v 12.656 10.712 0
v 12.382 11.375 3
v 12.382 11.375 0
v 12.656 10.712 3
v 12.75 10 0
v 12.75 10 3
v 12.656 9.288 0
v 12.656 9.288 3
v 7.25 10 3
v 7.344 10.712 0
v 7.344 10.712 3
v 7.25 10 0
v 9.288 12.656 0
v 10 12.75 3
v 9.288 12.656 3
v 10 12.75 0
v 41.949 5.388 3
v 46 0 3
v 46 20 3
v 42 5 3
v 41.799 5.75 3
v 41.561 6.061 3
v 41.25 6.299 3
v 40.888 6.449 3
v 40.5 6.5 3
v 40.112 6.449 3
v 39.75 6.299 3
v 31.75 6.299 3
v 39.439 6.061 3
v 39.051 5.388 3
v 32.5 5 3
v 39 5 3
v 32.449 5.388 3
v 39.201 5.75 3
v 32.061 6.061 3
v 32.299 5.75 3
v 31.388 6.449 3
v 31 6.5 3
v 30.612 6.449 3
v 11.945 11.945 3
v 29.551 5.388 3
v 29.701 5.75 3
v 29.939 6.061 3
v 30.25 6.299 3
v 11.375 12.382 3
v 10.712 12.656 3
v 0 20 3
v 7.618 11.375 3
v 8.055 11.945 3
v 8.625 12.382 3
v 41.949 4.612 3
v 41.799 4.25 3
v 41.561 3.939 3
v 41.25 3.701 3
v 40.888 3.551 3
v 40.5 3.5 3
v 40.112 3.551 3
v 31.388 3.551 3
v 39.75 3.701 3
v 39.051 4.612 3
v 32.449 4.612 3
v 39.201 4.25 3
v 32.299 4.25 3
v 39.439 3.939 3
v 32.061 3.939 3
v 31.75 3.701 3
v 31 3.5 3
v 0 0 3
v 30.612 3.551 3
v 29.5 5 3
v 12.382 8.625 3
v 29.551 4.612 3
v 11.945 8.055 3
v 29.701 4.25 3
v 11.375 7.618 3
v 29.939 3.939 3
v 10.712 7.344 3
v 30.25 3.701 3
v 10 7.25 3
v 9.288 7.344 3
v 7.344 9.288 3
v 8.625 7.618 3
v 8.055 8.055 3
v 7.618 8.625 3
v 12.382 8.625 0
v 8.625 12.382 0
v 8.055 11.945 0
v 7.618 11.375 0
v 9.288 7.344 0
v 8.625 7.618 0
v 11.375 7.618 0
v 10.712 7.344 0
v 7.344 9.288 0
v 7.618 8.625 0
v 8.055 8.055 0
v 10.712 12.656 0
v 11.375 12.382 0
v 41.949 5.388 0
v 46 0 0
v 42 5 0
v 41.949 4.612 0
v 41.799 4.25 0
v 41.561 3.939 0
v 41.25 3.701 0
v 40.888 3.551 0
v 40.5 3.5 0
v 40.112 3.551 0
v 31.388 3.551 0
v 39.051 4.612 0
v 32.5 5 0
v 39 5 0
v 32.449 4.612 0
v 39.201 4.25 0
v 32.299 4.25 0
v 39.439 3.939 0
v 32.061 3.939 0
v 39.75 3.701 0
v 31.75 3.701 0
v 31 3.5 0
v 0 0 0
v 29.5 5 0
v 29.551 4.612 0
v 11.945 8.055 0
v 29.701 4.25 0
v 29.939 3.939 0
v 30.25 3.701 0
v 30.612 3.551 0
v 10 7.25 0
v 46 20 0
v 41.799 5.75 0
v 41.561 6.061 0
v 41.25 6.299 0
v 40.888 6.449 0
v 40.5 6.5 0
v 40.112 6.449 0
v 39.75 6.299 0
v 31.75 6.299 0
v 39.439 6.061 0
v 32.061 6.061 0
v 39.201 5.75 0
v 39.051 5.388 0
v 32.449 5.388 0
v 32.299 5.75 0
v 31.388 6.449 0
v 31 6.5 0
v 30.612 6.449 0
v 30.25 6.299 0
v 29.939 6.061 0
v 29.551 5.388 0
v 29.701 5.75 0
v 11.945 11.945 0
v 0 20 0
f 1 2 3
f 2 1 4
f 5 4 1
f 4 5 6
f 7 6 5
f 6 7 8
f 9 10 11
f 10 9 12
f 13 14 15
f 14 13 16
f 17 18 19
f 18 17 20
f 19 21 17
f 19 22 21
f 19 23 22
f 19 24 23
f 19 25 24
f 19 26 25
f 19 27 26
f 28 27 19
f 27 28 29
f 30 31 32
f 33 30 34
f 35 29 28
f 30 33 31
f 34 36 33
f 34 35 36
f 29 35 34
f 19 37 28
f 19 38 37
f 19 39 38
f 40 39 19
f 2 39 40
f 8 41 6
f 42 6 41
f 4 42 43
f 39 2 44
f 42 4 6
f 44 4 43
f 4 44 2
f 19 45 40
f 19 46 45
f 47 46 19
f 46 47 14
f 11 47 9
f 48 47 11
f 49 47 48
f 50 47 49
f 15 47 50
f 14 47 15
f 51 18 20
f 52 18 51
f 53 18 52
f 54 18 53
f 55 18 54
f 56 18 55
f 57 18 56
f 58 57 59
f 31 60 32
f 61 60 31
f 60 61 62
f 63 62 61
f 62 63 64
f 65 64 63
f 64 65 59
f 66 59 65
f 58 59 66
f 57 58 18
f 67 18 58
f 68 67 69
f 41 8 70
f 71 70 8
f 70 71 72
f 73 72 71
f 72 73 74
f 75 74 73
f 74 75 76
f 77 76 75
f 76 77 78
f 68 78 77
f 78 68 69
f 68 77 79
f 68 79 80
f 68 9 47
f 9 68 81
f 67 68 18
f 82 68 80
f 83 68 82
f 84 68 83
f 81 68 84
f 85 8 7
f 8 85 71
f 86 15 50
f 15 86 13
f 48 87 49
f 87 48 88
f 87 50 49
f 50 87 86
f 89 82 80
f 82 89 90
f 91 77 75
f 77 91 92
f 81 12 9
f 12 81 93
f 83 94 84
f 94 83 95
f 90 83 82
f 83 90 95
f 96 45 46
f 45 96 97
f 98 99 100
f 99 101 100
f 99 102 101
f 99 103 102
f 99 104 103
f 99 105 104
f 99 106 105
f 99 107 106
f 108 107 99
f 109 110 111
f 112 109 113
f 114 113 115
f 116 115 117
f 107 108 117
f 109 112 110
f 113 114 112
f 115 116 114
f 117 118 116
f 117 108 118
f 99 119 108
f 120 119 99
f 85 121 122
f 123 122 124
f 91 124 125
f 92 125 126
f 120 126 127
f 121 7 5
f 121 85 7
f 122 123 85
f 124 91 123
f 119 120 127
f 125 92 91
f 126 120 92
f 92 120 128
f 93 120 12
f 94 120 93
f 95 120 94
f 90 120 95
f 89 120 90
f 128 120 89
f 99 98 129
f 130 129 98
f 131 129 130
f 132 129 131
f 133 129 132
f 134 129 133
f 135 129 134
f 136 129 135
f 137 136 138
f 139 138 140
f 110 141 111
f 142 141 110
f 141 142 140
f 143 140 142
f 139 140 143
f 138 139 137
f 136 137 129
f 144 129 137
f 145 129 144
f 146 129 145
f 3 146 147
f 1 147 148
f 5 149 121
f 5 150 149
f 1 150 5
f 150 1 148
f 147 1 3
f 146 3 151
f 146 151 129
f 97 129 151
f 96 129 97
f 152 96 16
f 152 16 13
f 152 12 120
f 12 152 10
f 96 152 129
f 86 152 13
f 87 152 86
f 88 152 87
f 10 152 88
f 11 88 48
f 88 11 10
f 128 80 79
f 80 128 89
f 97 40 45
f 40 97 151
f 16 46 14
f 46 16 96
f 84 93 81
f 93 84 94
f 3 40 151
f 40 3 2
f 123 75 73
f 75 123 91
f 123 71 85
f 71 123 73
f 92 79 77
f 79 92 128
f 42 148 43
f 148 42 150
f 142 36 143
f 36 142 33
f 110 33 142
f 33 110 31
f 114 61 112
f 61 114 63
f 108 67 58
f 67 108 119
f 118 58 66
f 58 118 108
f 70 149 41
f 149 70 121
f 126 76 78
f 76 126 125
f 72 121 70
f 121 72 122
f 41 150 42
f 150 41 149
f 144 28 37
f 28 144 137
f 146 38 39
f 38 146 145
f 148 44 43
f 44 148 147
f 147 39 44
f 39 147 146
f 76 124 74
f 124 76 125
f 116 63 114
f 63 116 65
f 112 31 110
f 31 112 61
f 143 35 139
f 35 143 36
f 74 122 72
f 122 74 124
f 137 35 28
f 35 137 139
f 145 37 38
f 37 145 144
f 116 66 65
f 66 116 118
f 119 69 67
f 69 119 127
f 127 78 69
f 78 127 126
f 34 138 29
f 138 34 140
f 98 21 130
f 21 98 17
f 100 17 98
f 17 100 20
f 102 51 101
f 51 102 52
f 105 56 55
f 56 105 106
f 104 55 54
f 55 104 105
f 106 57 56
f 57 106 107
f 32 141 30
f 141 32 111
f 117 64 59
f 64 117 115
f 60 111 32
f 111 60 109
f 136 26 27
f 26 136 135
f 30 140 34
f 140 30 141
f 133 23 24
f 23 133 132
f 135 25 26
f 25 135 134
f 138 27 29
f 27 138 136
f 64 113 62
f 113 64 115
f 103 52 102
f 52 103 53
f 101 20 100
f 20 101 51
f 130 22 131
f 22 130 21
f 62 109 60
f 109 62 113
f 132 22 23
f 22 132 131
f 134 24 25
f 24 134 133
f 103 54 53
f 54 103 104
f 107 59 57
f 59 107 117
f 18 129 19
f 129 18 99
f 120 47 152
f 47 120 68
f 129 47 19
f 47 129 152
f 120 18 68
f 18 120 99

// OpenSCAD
difference()
{
    union()
    {
        cube([20+6+20,20,3]);
    }
    
    union()
    {
        translate([10,10,0])
            cylinder(d=5.5,h=3,$fn=24);
        
        translate([20+6+5,5,0])
            cylinder(d=3,h=3,$fn=24);
        translate([20+6+5+9.5,5,0])
            cylinder(d=3,h=3,$fn=24);
    }
}
